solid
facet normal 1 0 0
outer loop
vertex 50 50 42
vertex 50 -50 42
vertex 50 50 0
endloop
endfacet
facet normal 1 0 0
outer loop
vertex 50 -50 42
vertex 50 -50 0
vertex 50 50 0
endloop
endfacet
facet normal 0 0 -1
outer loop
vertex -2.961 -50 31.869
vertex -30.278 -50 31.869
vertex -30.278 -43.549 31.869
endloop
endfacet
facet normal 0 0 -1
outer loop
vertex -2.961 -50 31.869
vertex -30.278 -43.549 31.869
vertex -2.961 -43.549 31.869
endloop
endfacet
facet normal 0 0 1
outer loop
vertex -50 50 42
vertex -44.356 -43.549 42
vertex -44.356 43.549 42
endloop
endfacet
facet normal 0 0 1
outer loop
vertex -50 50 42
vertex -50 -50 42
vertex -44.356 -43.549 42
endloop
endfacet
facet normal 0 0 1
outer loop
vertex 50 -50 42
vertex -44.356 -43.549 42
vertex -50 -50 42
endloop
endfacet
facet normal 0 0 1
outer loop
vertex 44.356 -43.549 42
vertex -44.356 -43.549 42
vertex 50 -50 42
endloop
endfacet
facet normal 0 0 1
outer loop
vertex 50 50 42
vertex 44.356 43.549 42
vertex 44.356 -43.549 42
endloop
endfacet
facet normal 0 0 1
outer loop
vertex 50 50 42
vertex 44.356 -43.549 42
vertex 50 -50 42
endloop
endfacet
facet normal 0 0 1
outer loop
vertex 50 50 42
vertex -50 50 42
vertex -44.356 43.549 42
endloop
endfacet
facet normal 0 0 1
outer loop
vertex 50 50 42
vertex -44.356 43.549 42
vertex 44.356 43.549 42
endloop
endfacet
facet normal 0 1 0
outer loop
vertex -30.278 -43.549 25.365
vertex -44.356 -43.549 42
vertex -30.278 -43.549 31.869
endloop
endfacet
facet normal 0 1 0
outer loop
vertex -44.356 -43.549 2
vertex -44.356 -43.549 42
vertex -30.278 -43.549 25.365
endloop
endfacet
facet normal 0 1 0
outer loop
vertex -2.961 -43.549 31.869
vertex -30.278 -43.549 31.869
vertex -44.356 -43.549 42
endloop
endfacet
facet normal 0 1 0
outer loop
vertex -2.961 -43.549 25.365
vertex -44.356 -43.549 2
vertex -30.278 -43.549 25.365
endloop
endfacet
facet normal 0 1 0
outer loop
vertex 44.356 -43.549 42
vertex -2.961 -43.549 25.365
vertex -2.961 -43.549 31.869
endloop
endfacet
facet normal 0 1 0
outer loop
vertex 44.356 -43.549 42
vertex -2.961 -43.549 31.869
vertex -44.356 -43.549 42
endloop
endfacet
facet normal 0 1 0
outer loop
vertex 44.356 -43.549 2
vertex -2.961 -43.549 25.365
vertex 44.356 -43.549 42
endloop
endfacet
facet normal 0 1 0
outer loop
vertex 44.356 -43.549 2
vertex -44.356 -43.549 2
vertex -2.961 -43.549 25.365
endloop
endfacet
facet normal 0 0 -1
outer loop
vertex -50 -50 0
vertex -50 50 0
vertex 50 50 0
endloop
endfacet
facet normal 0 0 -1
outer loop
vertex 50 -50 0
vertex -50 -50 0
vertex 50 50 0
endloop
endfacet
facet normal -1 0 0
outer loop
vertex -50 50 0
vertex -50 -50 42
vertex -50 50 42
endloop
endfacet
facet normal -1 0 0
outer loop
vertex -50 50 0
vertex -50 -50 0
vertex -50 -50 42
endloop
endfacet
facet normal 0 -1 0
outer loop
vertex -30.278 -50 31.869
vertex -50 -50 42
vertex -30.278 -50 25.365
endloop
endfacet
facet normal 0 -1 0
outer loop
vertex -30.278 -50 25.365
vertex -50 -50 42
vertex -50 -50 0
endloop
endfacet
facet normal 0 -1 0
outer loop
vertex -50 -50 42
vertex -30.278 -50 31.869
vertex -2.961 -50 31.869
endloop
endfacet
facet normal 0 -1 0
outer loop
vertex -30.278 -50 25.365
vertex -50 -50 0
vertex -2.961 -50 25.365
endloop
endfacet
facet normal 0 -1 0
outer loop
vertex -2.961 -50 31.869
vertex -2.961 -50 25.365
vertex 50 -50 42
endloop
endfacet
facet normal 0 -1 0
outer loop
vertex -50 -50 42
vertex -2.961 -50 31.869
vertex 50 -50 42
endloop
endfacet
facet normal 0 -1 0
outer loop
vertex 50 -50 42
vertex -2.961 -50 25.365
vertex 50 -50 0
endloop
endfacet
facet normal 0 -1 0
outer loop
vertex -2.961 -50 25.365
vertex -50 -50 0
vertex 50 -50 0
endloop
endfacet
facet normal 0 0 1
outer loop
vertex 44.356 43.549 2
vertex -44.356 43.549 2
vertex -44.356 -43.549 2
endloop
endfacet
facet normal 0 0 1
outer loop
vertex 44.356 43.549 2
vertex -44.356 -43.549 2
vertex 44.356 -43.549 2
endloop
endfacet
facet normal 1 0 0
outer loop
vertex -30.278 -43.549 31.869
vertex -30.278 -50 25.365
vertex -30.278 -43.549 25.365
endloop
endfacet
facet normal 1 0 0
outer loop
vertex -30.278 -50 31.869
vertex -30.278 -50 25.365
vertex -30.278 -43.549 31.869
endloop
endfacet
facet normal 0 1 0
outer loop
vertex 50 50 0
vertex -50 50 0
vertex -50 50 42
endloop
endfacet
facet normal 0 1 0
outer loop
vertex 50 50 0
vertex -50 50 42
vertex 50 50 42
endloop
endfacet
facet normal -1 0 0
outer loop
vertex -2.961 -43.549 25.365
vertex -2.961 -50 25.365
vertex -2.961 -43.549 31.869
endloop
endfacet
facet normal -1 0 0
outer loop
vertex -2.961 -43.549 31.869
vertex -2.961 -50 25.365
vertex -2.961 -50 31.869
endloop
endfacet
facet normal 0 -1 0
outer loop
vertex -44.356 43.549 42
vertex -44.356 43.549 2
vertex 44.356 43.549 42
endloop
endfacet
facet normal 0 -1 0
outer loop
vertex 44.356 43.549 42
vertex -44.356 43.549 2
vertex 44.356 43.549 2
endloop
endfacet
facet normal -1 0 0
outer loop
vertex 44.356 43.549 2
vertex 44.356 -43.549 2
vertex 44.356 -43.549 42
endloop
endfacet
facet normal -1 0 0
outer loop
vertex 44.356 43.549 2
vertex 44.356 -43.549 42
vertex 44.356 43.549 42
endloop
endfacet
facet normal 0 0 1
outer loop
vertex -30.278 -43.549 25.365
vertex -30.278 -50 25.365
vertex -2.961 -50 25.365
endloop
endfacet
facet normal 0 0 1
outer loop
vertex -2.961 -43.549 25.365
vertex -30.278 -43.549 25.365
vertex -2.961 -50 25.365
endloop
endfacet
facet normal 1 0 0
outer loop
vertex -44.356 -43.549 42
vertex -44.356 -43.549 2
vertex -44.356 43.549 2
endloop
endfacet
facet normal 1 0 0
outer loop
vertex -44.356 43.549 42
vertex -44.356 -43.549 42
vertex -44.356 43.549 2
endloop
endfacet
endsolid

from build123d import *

# Parameters (mm, degrees)
SKETCH_W      = 100
SKETCH_H      = 100
PAD_DEPTH     = 2
SKETCH002_W   = 100
SKETCH002_H   = 100
SKETCH002_W_2 = 88.711022
SKETCH002_H_2 = 87.098678
PAD001_DEPTH  = 40
SKETCH003_W   = 27.317078
SKETCH003_H   = 6.504059
POCKET_DEPTH  = 7


with BuildPart() as part:
    # Sketch → Pad (new body)
    with BuildSketch(Plane.XY):
        Rectangle(SKETCH_W, SKETCH_H)
    extrude(amount=PAD_DEPTH)

    # Sketch002 (on Face6 of Pad) → Pad001 (join)
    with BuildSketch(Plane.XY.offset(2)):
        Rectangle(SKETCH002_W, SKETCH002_H)
        Rectangle(SKETCH002_W_2, SKETCH002_H_2, mode=Mode.SUBTRACT)
    extrude(amount=PAD001_DEPTH)

    # Sketch003 (on Face8 of Pad001) → Pocket (cut)
    with BuildSketch(Plane.XZ.offset(50)):
        with Locations((-16.619589, 28.616544)):
            Rectangle(SKETCH003_W, SKETCH003_H)
    extrude(amount=-POCKET_DEPTH, mode=Mode.SUBTRACT)


solid = part.part
